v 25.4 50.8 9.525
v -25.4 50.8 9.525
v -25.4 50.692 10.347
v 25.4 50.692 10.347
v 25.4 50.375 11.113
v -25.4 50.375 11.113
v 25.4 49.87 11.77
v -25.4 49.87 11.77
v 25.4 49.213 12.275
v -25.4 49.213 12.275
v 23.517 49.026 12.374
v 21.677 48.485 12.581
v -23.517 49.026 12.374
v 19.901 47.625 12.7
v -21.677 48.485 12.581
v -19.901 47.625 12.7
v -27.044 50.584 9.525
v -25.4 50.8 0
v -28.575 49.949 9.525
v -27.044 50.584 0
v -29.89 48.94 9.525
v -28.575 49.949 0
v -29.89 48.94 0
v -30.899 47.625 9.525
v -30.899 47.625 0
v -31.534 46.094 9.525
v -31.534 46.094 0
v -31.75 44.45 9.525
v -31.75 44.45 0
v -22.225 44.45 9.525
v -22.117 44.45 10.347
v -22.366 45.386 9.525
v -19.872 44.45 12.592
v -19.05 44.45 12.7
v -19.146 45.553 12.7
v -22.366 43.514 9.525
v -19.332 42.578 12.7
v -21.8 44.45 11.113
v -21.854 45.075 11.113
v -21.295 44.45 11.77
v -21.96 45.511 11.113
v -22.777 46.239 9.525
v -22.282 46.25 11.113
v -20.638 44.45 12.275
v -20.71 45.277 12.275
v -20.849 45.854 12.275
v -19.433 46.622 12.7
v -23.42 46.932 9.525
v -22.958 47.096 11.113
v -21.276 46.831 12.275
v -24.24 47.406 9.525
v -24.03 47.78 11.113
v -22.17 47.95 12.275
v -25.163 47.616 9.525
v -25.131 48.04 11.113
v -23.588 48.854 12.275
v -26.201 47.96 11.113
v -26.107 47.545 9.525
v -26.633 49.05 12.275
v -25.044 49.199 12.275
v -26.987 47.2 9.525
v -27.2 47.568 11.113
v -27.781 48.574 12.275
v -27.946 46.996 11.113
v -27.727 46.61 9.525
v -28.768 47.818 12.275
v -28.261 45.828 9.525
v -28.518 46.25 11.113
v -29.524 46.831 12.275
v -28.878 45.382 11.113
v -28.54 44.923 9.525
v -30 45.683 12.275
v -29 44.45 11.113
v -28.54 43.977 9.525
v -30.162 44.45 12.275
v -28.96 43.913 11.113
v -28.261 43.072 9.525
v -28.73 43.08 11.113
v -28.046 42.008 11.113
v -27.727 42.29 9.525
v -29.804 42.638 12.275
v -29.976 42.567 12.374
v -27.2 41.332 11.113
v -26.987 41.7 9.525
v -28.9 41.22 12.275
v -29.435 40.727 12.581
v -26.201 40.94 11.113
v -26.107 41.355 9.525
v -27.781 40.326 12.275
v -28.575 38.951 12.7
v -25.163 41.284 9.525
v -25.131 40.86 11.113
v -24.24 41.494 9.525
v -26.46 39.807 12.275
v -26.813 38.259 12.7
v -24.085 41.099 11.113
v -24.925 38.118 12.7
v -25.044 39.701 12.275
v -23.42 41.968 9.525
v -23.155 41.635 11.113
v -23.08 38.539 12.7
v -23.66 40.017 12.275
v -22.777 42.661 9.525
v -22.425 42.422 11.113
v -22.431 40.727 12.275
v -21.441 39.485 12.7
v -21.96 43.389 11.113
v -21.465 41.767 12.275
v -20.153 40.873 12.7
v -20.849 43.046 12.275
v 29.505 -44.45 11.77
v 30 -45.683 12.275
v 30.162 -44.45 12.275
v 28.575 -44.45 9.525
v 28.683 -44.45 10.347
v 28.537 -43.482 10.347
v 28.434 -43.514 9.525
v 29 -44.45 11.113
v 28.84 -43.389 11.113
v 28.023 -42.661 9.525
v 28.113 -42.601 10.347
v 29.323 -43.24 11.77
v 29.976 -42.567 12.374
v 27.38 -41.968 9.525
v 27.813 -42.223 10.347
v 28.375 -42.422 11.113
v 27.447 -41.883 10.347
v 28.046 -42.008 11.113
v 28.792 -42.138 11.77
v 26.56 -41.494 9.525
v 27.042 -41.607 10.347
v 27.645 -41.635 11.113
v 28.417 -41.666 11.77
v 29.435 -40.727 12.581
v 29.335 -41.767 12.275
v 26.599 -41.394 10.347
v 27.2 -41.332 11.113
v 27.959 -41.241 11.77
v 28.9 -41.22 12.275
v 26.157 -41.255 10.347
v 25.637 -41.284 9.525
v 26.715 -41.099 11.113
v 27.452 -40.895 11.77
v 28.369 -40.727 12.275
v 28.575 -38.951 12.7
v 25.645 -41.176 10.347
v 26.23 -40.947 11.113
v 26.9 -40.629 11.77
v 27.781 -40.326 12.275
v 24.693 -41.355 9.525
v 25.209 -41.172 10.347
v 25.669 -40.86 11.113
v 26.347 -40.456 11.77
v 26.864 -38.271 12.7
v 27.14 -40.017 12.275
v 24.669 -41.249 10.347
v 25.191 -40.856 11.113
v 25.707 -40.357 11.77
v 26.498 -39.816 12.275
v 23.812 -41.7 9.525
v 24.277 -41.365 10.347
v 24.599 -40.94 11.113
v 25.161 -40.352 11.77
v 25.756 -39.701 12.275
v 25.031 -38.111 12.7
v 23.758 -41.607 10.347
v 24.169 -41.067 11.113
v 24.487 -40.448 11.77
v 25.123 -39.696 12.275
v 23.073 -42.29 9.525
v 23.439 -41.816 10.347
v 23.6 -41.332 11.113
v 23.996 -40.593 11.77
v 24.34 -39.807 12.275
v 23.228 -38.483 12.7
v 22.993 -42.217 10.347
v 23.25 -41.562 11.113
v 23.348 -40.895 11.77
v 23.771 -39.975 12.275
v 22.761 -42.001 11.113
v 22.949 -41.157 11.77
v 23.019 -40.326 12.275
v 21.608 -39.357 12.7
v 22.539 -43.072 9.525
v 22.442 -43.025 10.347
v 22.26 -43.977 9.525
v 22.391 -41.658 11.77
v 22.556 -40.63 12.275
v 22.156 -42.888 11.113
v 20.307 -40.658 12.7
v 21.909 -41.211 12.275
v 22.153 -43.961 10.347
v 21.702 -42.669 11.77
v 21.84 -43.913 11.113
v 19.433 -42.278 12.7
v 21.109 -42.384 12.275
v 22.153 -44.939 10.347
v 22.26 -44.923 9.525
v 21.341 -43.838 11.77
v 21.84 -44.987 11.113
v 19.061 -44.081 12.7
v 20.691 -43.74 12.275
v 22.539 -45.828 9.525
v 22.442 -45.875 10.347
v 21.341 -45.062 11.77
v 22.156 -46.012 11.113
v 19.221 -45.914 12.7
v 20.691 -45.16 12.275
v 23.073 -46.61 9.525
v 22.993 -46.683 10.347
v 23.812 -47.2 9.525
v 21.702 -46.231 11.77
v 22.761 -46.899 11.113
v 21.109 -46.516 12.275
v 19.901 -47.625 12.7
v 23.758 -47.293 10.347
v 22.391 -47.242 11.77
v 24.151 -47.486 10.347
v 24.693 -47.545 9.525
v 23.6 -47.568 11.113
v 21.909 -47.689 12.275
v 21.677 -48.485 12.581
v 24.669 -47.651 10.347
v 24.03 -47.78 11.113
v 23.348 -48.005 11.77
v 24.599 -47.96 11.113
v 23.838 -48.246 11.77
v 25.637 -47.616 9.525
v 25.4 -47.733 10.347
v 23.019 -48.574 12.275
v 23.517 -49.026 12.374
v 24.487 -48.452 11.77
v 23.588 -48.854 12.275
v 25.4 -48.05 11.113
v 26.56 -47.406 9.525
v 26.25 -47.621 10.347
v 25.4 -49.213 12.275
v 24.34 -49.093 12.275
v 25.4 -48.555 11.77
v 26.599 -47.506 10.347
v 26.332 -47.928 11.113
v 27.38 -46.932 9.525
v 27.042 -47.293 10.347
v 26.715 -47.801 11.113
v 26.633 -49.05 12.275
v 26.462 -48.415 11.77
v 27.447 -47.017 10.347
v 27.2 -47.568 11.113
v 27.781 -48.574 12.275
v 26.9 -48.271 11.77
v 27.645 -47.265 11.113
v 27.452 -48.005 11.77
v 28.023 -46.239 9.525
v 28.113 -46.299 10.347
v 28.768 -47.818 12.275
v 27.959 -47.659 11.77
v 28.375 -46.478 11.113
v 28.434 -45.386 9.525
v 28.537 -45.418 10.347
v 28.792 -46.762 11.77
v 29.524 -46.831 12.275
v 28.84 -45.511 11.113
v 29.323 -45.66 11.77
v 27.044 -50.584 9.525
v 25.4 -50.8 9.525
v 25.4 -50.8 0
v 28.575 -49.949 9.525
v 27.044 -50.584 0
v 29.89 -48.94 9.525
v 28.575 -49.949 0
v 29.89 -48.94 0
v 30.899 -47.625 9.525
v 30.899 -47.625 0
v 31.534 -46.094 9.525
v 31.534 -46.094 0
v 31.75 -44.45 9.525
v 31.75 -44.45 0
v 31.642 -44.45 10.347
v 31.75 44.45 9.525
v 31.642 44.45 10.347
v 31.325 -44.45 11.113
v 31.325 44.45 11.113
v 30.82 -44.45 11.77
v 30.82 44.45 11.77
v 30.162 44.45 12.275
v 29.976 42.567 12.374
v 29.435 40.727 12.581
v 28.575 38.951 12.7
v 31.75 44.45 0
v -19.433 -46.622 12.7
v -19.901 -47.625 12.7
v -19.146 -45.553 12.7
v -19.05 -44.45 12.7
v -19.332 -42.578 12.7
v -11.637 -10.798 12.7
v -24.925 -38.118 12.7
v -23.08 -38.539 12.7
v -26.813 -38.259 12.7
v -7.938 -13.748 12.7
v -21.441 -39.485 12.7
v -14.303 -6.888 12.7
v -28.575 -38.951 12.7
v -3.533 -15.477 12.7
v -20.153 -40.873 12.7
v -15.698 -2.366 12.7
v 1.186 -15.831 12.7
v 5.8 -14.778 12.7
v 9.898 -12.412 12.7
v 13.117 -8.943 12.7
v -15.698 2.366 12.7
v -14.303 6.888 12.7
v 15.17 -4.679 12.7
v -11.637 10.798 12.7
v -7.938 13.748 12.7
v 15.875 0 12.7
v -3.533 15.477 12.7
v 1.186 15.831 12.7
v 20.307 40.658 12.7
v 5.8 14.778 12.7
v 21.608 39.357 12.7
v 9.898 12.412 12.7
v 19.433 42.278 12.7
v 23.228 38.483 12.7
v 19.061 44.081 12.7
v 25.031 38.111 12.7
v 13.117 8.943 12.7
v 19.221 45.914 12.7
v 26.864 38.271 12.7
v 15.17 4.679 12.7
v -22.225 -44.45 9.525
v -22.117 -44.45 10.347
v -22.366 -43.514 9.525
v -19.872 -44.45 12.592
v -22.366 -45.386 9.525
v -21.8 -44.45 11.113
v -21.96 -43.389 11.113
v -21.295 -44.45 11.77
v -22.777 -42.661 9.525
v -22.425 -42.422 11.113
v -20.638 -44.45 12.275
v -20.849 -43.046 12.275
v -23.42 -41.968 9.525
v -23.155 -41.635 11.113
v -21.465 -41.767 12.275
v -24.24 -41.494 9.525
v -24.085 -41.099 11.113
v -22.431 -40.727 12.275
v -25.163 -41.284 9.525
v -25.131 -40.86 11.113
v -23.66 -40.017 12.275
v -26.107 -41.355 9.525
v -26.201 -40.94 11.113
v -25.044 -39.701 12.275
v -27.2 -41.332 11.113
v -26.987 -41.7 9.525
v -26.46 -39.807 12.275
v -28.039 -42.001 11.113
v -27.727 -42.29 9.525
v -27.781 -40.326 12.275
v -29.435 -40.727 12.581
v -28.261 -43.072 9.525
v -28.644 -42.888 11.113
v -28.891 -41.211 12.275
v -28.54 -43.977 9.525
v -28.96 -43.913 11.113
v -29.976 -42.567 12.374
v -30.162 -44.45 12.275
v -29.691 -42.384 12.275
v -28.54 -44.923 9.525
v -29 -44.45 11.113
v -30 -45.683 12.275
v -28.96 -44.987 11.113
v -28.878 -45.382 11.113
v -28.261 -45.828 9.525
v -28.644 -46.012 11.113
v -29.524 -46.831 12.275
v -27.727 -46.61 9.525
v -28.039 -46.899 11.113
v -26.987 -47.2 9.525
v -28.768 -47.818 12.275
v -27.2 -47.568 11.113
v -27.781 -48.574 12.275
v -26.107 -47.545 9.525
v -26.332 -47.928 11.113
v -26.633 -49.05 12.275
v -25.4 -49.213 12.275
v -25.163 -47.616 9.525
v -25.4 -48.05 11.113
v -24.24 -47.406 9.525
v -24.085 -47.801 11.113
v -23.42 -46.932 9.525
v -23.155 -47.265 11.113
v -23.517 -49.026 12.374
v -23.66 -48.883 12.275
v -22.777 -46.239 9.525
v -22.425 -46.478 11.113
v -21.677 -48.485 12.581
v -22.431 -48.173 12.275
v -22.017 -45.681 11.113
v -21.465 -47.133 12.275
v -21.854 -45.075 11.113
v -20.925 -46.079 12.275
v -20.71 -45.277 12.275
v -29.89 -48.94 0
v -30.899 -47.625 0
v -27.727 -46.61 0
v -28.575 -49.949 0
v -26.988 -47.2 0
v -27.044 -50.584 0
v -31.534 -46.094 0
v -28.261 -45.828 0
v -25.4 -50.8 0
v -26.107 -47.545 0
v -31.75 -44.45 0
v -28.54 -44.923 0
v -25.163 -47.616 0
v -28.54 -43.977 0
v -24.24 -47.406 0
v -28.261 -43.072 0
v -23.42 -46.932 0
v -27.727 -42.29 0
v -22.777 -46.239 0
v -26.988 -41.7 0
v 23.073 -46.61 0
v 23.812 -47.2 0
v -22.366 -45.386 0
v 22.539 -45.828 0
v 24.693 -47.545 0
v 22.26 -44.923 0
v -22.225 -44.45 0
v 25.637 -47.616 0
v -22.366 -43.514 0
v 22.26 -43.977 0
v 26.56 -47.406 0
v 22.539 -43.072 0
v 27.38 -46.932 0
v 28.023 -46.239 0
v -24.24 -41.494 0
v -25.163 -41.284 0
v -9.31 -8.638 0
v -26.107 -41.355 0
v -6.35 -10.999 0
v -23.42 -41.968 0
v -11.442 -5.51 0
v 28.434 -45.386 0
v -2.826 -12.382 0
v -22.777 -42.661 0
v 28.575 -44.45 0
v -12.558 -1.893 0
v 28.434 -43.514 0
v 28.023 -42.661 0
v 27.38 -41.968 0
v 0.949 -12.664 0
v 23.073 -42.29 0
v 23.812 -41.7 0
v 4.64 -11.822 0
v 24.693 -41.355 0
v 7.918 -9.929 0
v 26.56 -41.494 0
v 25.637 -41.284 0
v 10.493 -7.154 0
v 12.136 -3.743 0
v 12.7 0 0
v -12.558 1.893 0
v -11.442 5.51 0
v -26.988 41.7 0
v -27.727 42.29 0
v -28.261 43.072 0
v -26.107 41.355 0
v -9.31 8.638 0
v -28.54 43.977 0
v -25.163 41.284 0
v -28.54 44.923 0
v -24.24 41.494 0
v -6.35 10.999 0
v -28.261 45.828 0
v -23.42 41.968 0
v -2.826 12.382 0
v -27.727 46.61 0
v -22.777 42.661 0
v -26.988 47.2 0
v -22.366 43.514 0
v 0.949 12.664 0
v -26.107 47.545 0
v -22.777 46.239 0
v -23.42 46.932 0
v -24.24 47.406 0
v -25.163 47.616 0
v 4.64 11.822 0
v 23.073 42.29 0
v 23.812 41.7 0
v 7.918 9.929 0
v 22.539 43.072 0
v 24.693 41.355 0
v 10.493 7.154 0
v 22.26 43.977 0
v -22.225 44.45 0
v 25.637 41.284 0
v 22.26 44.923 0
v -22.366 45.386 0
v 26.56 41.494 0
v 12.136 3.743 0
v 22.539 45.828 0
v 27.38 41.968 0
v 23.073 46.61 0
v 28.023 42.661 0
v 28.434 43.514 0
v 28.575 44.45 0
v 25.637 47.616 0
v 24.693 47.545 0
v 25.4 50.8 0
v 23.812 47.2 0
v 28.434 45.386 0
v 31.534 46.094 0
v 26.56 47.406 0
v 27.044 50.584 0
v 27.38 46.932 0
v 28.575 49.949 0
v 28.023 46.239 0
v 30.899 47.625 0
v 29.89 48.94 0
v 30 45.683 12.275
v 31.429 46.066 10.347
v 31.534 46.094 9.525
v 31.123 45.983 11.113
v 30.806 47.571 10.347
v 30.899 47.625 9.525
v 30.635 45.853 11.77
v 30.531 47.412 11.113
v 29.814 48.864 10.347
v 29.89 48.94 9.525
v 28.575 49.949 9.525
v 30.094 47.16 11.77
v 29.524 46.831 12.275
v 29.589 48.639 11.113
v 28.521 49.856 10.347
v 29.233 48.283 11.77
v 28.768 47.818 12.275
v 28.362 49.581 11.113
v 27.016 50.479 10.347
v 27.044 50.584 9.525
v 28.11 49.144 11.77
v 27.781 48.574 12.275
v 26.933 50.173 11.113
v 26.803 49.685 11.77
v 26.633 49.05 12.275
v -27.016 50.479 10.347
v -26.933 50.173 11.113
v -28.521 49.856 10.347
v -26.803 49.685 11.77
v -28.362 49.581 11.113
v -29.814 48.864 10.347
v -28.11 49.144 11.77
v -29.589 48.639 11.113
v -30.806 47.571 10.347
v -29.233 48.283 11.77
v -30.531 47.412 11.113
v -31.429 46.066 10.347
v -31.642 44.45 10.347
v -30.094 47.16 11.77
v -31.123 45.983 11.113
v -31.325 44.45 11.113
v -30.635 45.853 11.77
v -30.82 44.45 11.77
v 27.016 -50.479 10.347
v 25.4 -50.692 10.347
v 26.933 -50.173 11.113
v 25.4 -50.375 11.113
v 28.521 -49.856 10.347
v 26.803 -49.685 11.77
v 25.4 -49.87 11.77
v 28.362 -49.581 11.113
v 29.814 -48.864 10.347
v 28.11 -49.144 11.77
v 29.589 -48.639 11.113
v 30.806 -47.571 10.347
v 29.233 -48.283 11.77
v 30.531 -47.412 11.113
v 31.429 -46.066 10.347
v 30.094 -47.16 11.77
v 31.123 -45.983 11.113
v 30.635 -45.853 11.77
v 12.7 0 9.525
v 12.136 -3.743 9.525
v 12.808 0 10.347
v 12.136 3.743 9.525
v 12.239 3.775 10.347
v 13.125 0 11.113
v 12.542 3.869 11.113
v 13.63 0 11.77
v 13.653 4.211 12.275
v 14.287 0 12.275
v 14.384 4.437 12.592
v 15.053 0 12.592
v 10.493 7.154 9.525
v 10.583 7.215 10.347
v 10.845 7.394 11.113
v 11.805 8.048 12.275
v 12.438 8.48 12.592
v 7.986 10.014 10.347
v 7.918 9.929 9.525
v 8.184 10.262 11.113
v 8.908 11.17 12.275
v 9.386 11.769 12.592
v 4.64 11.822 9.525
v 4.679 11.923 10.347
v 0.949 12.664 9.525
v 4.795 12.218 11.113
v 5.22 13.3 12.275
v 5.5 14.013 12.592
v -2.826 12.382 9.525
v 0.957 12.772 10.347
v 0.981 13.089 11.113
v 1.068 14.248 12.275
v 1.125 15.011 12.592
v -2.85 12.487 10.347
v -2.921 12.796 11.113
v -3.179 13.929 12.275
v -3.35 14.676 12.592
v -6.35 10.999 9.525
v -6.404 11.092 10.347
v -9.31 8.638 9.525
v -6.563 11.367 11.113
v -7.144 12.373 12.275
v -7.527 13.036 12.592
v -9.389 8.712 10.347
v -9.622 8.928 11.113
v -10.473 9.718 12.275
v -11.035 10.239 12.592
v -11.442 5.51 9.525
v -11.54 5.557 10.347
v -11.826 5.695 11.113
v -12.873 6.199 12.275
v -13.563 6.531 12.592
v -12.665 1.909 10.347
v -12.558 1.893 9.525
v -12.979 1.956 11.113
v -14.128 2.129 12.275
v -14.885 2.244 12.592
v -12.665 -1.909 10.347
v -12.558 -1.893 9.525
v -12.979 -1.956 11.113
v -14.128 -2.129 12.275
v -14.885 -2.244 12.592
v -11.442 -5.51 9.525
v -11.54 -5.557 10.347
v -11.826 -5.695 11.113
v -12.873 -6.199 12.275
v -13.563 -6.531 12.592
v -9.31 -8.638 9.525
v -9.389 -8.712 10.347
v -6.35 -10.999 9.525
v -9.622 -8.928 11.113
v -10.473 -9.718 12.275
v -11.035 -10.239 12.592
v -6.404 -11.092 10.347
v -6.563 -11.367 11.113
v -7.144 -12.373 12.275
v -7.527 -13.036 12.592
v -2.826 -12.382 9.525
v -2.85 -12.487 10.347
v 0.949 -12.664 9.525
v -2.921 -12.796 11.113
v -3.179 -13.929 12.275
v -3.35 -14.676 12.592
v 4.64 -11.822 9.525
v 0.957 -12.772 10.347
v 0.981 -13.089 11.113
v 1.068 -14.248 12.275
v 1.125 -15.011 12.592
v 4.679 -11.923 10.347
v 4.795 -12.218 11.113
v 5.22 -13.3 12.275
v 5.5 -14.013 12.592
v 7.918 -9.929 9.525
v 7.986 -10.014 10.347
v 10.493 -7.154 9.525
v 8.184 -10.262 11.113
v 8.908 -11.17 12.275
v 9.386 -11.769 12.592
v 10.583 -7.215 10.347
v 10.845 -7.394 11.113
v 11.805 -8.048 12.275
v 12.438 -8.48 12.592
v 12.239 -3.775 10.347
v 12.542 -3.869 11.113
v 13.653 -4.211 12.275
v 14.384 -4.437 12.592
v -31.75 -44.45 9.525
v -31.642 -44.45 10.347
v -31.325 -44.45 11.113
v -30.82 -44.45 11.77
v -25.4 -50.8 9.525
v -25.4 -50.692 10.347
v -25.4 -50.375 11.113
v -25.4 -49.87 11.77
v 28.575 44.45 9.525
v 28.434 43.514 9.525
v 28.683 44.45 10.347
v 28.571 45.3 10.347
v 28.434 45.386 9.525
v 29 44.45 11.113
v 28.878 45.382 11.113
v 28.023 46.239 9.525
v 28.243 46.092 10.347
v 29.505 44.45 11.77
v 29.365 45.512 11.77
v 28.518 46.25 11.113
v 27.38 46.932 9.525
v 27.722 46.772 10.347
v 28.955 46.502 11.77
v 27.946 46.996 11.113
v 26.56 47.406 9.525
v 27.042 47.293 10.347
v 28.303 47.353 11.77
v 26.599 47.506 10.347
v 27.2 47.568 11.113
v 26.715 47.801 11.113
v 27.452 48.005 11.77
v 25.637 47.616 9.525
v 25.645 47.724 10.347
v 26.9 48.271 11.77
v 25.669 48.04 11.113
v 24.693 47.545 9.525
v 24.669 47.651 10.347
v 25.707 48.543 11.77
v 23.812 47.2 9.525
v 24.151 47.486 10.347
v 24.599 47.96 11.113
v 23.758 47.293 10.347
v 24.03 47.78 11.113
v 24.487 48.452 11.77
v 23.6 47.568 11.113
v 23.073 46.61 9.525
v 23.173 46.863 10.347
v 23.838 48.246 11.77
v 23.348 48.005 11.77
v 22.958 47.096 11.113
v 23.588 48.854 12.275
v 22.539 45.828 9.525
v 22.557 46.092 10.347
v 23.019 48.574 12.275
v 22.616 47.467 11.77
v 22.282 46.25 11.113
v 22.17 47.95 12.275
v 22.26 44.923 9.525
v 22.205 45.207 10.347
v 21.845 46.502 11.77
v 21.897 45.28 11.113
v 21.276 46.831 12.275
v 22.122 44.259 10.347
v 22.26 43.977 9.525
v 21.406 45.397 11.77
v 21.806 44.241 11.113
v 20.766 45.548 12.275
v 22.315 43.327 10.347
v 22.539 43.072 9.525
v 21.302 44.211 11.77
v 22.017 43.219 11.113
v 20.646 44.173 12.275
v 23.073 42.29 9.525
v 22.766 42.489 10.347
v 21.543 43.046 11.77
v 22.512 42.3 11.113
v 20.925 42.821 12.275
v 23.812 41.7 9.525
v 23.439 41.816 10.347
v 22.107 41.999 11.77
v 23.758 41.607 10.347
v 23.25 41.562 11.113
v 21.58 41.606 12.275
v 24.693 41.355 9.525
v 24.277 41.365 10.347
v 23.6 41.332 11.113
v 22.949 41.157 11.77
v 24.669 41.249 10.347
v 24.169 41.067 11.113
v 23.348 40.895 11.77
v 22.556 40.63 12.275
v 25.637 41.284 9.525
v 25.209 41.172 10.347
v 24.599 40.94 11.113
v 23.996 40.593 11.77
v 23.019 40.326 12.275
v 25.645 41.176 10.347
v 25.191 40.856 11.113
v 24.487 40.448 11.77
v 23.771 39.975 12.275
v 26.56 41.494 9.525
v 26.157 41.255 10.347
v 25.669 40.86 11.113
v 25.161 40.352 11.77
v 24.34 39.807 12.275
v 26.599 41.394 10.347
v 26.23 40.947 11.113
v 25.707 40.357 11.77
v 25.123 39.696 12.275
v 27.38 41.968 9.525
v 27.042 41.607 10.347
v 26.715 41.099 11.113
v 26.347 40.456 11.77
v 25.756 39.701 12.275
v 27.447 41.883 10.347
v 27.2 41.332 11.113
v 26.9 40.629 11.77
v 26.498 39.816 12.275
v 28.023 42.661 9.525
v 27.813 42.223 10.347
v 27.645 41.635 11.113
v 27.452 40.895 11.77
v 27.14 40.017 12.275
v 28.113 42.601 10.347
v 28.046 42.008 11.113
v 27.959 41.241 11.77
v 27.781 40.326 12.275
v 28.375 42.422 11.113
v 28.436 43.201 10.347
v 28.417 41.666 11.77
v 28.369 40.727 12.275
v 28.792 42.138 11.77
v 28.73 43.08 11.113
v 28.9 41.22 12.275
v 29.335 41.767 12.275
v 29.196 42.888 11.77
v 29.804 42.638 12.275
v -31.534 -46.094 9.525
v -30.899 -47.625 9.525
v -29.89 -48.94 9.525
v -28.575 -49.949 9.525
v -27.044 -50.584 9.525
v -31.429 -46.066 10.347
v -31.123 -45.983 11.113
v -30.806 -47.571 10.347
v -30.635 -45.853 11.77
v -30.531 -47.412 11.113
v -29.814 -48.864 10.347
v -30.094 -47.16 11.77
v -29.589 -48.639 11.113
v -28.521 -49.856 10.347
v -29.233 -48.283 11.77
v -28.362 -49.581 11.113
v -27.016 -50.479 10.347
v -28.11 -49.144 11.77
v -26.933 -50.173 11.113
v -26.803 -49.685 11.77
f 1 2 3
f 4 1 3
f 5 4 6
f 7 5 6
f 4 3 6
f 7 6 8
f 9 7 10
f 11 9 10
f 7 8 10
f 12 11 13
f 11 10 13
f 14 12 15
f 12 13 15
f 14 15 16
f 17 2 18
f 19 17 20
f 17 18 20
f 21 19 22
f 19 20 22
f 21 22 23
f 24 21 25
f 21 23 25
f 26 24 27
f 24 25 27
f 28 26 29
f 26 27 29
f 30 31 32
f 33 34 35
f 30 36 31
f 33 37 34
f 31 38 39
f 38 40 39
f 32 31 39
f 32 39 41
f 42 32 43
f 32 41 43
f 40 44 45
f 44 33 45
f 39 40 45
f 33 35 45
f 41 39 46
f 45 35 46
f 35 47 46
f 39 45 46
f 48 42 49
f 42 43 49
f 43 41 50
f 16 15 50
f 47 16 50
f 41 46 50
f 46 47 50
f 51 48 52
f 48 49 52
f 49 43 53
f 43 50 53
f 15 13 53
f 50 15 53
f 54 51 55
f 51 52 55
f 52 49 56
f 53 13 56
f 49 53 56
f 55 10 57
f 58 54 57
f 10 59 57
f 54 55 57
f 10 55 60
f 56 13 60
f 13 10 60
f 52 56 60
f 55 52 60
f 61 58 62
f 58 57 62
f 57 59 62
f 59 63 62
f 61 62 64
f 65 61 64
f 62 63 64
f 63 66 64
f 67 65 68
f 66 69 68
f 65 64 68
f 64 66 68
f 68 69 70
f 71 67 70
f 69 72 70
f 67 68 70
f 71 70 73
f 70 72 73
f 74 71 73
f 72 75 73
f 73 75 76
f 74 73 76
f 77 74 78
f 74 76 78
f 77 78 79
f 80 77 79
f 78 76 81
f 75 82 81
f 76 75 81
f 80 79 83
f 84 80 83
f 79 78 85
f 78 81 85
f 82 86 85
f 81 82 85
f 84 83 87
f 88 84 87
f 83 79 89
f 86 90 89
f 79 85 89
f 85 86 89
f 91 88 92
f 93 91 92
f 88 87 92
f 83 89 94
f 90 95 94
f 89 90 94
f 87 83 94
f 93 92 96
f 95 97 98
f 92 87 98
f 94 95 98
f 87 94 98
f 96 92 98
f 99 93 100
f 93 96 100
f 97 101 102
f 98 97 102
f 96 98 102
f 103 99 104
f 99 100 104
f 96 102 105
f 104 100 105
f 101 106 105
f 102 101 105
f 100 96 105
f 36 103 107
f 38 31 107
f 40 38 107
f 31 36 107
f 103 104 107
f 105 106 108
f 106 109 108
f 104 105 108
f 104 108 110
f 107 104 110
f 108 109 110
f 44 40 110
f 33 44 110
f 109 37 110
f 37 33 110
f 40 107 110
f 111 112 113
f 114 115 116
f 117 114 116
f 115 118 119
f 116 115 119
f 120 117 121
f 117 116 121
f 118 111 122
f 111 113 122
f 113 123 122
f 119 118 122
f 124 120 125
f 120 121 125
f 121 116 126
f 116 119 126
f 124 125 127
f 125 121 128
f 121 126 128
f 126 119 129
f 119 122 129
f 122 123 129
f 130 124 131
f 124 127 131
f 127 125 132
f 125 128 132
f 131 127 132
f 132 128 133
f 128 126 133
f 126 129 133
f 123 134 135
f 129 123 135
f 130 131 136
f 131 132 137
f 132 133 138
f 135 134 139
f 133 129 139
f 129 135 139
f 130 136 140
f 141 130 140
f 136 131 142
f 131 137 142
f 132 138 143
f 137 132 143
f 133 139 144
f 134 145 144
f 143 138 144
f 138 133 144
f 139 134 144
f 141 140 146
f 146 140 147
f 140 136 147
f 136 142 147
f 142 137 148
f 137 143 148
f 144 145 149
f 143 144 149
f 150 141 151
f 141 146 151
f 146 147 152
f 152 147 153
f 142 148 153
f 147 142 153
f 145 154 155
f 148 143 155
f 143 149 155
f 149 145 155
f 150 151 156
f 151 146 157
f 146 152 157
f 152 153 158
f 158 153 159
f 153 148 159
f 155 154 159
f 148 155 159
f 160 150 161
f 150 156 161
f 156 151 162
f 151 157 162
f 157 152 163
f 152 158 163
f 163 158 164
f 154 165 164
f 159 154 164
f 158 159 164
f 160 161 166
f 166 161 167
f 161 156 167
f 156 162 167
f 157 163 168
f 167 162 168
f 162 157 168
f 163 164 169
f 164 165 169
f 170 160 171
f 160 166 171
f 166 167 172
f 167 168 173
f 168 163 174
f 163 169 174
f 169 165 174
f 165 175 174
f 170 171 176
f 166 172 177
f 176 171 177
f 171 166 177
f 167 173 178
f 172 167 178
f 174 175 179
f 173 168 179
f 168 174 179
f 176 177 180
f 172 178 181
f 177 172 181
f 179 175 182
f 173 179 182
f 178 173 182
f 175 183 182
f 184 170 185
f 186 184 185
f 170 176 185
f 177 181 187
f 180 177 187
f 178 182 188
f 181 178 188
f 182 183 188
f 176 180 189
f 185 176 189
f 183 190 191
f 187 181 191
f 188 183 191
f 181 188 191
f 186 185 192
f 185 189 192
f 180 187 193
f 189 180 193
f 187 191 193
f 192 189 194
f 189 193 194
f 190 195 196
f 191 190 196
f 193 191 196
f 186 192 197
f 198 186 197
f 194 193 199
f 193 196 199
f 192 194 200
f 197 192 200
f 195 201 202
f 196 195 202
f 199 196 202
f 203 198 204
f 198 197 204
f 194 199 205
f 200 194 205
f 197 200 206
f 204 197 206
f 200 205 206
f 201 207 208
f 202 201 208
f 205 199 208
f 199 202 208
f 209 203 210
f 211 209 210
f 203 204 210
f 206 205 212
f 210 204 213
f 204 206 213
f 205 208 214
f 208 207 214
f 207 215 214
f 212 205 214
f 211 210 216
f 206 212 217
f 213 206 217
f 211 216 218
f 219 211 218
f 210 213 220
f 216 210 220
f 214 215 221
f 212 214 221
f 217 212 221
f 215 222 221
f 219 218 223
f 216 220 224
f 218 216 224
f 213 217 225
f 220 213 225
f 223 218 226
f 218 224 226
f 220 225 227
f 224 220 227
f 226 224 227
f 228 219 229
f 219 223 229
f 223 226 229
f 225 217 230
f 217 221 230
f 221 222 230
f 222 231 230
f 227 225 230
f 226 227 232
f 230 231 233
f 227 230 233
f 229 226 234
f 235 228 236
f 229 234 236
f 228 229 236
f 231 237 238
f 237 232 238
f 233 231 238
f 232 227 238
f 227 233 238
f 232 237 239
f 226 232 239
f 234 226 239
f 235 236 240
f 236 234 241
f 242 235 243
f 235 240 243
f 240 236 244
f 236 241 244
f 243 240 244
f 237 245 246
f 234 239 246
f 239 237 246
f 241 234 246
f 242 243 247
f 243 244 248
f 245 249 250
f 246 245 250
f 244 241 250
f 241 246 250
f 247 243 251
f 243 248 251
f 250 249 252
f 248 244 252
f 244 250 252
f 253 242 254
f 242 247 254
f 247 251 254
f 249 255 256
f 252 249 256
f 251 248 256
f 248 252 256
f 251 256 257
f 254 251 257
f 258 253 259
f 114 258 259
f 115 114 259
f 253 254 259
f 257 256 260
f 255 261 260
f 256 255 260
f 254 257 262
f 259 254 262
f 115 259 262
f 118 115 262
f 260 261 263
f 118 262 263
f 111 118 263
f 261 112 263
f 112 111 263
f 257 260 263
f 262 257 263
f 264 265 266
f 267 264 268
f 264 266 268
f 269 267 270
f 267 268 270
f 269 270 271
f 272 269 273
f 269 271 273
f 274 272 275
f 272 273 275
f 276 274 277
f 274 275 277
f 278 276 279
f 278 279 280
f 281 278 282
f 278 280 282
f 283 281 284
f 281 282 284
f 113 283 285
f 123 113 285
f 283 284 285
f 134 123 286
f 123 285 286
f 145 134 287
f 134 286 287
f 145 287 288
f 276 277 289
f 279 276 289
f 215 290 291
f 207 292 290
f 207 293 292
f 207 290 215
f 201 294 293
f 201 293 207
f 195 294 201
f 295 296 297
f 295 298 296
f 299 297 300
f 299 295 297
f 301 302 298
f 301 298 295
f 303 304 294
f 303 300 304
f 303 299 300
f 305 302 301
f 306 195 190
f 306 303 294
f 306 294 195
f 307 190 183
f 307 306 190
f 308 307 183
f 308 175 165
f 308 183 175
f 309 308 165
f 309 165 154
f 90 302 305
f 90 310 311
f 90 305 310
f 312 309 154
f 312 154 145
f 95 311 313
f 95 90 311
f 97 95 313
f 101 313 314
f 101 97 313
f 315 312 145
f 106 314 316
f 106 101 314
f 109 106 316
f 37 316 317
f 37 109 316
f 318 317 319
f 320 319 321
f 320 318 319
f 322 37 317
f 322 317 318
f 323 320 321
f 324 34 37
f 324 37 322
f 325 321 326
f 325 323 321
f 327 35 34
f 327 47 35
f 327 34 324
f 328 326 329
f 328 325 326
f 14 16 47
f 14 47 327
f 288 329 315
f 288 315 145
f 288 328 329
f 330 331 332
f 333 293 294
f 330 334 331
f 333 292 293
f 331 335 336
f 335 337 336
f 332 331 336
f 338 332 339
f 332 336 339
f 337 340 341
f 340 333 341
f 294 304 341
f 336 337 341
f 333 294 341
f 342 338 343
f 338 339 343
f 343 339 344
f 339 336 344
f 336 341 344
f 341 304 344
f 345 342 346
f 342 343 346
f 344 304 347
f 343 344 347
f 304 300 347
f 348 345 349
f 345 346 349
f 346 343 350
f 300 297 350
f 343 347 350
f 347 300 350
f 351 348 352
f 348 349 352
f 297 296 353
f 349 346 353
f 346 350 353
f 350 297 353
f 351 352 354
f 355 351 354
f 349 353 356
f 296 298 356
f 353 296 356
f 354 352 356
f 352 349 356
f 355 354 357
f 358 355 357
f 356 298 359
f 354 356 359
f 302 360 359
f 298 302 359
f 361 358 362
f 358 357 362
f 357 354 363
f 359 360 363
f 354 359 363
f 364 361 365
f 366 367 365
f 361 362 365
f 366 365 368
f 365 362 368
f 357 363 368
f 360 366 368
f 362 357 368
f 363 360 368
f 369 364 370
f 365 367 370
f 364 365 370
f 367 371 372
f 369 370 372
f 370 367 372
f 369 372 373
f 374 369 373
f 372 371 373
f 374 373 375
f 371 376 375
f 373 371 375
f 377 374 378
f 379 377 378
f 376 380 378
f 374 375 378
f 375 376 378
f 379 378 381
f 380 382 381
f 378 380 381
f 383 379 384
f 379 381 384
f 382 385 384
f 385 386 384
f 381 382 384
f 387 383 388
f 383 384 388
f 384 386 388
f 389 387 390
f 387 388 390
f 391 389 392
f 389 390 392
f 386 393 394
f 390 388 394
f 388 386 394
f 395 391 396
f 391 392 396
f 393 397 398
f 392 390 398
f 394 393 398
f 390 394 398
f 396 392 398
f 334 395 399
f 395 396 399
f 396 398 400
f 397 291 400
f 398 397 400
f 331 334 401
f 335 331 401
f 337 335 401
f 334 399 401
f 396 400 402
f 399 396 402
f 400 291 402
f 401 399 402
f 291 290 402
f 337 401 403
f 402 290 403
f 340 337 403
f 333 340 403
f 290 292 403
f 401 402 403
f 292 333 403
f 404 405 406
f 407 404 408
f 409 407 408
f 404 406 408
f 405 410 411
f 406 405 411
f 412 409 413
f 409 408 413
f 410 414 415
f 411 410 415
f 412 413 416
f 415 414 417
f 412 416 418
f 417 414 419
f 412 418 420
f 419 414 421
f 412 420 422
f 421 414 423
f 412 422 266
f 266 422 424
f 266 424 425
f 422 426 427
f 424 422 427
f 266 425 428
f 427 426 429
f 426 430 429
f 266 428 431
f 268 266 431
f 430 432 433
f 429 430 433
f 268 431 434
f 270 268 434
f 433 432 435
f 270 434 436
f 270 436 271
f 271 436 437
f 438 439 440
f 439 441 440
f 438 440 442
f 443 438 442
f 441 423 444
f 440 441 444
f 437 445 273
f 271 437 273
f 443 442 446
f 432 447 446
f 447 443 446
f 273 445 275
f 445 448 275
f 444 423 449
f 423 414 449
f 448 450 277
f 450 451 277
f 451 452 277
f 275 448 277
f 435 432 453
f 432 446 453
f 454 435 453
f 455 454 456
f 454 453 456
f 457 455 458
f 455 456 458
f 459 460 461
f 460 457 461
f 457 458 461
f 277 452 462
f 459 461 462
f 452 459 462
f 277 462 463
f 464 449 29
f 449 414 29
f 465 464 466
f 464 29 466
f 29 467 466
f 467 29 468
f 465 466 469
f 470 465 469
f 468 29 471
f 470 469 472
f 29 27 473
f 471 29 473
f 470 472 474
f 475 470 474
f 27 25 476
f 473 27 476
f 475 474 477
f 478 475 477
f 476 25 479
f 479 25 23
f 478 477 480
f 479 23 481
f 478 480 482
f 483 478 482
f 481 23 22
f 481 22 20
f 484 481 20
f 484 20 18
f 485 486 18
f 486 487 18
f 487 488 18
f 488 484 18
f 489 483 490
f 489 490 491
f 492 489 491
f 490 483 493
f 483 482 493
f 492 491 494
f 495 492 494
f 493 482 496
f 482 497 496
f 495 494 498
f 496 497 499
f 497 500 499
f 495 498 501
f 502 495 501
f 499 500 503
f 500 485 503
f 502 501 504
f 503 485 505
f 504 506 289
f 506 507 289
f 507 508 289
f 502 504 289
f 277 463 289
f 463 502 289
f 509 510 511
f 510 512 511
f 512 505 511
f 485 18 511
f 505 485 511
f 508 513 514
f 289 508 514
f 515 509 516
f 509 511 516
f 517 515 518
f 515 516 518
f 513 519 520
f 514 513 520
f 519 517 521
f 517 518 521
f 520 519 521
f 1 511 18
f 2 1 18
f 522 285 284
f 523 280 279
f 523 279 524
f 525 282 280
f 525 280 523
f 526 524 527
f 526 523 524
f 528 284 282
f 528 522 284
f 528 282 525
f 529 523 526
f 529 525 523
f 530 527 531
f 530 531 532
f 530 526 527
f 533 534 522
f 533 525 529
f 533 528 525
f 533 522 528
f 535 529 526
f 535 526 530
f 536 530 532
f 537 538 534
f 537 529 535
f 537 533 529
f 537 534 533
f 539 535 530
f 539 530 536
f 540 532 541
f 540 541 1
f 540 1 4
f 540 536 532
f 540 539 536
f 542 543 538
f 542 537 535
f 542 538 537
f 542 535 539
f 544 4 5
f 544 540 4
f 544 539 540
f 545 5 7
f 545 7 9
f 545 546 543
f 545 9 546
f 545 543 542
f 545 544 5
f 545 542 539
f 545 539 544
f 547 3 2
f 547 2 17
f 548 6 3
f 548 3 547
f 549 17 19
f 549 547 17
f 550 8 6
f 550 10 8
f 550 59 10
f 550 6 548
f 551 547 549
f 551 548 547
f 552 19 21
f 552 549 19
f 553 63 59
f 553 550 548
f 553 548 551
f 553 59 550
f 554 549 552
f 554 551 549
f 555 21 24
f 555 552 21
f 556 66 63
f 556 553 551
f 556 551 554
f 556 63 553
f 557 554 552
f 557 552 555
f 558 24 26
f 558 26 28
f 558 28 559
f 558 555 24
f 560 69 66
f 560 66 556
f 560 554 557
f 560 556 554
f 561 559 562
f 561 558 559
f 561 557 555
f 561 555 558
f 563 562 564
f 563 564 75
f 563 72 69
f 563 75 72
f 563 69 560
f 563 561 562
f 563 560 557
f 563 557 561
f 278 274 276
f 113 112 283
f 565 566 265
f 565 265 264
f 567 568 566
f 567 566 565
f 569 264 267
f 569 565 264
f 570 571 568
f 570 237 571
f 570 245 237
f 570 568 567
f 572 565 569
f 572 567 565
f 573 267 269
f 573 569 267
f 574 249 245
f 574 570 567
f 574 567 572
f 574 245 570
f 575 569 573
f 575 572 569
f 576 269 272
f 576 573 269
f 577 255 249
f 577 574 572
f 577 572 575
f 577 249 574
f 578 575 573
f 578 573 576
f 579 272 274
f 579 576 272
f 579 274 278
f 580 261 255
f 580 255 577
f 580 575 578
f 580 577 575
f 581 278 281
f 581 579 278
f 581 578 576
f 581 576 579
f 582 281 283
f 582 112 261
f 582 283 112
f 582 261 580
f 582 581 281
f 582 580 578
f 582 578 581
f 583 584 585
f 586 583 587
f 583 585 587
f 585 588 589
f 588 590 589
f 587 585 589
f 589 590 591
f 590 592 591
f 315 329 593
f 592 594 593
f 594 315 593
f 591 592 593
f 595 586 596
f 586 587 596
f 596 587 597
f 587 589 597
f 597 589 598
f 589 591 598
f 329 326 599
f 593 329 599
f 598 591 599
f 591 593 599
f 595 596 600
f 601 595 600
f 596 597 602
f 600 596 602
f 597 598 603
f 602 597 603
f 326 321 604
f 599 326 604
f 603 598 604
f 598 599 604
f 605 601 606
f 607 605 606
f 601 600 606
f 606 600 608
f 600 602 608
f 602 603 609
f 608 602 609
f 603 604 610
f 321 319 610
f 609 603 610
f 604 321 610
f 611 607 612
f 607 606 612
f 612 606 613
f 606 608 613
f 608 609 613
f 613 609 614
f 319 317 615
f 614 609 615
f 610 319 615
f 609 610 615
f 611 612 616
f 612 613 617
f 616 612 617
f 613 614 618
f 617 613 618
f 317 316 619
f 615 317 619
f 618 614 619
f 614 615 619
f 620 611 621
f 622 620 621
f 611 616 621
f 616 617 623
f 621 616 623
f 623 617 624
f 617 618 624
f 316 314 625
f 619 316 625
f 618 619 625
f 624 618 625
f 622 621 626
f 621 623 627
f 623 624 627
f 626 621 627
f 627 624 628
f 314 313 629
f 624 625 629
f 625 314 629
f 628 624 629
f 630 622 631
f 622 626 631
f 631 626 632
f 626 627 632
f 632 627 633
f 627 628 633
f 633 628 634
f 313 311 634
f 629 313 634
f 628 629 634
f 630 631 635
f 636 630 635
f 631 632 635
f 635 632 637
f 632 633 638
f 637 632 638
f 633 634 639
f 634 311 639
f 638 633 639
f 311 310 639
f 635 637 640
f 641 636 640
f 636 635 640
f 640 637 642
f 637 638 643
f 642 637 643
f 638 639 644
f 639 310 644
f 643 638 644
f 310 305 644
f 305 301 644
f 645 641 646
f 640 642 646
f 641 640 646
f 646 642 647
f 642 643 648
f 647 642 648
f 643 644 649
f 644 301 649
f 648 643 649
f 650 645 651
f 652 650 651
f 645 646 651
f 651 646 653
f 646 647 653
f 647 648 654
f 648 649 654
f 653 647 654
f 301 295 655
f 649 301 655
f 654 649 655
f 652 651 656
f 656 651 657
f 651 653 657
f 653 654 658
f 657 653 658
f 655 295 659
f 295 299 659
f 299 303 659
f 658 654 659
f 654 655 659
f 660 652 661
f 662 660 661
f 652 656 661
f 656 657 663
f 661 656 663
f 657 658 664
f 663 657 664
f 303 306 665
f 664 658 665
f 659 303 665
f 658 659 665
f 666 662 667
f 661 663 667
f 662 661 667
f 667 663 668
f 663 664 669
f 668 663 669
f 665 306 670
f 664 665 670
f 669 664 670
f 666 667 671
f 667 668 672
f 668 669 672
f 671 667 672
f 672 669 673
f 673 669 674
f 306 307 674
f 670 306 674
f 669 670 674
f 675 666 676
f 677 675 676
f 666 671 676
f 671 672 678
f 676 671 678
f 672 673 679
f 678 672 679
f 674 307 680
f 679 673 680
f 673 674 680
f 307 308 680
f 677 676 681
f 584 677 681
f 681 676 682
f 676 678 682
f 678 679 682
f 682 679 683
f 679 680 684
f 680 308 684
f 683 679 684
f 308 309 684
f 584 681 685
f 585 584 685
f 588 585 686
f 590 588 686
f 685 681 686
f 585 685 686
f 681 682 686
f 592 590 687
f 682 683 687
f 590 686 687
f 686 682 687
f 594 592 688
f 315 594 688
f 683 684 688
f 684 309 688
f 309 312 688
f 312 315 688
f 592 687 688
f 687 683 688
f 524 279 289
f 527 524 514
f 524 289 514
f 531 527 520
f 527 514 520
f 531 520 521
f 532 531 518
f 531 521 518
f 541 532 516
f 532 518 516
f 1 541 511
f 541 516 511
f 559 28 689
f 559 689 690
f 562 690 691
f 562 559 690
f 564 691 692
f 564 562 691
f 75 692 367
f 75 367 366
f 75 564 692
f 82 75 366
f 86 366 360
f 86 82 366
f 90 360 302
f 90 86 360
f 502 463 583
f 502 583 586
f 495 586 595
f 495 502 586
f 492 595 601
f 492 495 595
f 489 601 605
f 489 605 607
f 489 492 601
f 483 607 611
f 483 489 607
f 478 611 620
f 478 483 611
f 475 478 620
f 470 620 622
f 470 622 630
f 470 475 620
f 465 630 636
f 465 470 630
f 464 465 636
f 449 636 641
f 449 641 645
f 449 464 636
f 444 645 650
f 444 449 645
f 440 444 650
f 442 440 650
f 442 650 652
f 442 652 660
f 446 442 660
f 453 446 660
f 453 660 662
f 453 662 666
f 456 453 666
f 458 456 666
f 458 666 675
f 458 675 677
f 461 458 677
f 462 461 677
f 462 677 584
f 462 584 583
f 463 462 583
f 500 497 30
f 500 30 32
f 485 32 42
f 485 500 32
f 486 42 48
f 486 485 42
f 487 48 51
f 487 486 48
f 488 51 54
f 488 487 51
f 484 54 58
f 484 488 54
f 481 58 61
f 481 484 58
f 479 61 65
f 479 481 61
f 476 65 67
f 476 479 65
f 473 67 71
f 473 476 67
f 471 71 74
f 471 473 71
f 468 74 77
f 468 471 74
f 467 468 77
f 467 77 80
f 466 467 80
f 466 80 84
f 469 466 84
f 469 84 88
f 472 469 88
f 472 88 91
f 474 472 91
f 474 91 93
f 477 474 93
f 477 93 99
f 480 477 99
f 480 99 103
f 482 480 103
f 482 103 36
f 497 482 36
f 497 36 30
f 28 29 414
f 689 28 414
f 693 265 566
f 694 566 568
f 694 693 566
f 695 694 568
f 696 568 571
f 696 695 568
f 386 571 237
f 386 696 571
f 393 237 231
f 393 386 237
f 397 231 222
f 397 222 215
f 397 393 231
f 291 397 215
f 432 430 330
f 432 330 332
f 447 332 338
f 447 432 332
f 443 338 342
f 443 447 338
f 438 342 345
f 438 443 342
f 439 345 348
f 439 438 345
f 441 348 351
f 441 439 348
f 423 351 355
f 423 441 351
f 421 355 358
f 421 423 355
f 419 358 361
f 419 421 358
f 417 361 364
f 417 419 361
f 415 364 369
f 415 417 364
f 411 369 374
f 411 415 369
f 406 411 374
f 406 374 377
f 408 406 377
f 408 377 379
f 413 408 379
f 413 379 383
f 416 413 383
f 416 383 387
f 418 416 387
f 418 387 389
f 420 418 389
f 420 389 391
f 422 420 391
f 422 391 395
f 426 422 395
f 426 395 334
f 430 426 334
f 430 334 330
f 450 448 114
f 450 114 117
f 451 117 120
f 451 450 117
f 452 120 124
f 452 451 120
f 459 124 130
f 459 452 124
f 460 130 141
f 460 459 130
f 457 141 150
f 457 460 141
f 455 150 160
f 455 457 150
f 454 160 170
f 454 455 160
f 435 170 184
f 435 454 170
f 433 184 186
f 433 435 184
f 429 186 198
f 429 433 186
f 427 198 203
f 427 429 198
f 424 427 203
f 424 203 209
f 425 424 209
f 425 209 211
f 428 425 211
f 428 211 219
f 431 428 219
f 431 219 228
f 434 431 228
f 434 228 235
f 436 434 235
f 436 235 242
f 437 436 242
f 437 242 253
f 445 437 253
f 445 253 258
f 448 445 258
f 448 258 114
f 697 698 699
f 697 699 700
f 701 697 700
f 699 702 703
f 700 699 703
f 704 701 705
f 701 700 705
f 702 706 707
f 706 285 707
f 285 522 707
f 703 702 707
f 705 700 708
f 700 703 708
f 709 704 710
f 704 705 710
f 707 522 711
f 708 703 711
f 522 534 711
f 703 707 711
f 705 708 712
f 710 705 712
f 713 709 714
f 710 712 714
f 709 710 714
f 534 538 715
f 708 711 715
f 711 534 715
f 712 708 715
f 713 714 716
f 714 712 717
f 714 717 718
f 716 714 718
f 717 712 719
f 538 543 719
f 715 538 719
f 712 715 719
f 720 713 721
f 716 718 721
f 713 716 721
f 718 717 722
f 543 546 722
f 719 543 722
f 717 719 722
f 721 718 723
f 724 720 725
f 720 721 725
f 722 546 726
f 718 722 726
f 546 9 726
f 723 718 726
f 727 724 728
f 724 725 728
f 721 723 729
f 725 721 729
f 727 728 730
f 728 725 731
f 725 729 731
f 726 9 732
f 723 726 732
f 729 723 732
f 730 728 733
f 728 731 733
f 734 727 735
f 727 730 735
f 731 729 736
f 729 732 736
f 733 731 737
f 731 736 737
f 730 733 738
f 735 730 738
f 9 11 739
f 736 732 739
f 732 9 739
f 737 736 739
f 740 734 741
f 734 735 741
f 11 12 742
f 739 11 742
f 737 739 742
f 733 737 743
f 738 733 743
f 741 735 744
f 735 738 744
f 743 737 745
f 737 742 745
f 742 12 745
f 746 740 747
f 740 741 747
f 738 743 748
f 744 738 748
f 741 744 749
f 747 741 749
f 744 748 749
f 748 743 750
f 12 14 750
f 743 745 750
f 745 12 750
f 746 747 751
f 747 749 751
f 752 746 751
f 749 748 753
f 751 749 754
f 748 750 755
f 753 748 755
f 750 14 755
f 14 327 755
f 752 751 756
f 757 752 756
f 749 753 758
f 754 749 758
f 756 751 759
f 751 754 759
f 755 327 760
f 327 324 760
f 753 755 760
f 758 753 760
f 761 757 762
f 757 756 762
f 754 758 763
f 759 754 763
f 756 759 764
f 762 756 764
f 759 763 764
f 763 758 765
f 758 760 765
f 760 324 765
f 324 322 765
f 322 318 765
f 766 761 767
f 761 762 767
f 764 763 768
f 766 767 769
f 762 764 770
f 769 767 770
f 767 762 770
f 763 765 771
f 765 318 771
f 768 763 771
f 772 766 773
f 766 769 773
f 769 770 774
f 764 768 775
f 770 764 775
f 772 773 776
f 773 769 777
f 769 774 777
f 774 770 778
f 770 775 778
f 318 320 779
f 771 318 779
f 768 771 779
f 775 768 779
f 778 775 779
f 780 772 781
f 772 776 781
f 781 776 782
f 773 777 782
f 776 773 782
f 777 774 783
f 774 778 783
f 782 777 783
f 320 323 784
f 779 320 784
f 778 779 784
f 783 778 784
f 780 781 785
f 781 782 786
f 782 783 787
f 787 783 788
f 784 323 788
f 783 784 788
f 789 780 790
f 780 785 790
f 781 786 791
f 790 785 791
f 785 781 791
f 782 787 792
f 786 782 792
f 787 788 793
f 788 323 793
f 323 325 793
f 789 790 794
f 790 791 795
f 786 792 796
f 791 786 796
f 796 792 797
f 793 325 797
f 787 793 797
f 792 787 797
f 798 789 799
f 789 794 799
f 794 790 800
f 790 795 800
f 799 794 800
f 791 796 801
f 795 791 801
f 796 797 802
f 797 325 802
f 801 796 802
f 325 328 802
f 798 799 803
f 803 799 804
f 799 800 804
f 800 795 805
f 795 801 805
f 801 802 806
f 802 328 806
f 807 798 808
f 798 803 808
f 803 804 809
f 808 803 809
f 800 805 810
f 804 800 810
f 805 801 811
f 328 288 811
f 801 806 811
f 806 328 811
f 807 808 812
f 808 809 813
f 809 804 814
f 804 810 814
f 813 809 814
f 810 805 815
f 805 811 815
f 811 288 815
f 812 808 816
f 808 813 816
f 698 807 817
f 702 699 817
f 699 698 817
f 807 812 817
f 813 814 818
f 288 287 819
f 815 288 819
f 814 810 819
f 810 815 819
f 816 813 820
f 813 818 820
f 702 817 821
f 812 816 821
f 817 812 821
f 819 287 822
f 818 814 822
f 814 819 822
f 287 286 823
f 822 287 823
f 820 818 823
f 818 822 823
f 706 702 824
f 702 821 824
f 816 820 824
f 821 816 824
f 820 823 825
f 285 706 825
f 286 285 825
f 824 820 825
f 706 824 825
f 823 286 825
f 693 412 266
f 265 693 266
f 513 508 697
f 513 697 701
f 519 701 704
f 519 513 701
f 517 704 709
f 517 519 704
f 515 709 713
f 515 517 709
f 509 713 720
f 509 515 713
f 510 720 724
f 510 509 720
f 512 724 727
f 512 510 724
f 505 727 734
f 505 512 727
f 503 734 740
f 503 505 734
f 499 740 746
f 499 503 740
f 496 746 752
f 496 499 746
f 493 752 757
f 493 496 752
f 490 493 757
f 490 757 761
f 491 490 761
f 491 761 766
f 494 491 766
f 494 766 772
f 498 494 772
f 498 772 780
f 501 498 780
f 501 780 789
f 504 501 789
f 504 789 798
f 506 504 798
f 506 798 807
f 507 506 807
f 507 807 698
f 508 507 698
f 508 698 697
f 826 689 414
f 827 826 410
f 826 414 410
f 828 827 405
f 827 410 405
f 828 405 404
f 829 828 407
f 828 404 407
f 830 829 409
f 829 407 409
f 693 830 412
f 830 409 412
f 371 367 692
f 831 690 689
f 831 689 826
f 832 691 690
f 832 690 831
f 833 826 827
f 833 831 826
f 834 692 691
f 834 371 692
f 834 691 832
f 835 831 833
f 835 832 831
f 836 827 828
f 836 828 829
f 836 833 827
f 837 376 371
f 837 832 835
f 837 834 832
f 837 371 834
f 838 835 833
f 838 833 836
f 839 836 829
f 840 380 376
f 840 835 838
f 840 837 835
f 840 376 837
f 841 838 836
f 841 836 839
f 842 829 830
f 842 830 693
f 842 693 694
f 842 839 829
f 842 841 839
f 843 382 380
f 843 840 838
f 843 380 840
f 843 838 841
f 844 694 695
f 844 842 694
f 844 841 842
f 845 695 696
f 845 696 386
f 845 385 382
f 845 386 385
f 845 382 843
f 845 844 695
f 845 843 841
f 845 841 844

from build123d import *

# Parameters (mm, degrees)
F0_R         = 3.175
F0_R_2       = 12.7
F1_DEPTH     = 12.7
F2_T1_DEPTH  = 50.8
F2_T3_DEPTH  = 88.9
F2_T6_ANGLE  = 90
F2_T8_ANGLE  = 90
F2_T10_ANGLE = 90
F2_T12_ANGLE = 90


# Not quite as in the source:
# - a fillet or chamfer that OpenCascade refuses, or shapes differently, is made with other operations: its cross-section is extruded or revolved along the edge and cut away or added


with BuildPart() as f1:
    # F0 (on Top) → F1 (new body)
    with BuildSketch(Plane.XY):
        with BuildLine():
            ThreePointArc((31.75, 44.45), (29.8901280605, 48.9401280605), (25.4, 50.8))
            Line((25.4, 50.8), (-25.4, 50.8))
            ThreePointArc((-25.4, 50.8), (-29.8901280605, 48.9401280605), (-31.75, 44.45))
            Line((-31.75, 44.45), (-31.75, -44.45))
            ThreePointArc((-31.75, -44.45), (-29.8901280605, -48.9401280605), (-25.4, -50.8))
            Line((-25.4, -50.8), (25.4, -50.8))
            ThreePointArc((25.4, -50.8), (29.8901280605, -48.9401280605), (31.75, -44.45))
            Line((31.75, -44.45), (31.75, 44.45))
        make_face()
        with Locations((-25.4, -44.45)):
            Circle(F0_R, mode=Mode.SUBTRACT)
        with Locations((25.4, -44.45)):
            Circle(F0_R, mode=Mode.SUBTRACT)
        Circle(F0_R_2, mode=Mode.SUBTRACT)
        with Locations((-25.4, 44.45)):
            Circle(F0_R, mode=Mode.SUBTRACT)
        with Locations((25.4, 44.45)):
            Circle(F0_R, mode=Mode.SUBTRACT)
    extrude(amount=F1_DEPTH)

    # F2: fillet of radius 3.175 on 13 edges, made by hand

    # F2_s2 → F2_t1 (cut)
    with BuildSketch(Plane.YZ.offset(-25.4)):
        with BuildLine():
            ThreePointArc((50.8, 9.525), (49.8700640303, 11.7700640303), (47.625, 12.7))
            Line((47.625, 12.7), (50.8, 12.7))
            Line((50.8, 12.7), (50.8, 9.525))
        make_face()
        with BuildLine():
            ThreePointArc((-50.8, 9.525), (-49.8700640303, 11.7700640303), (-47.625, 12.7))
            Line((-47.625, 12.7), (-50.8, 12.7))
            Line((-50.8, 12.7), (-50.8, 9.525))
        make_face()
    extrude(amount=F2_T1_DEPTH, mode=Mode.SUBTRACT)

    # F2_s4 → F2_t3 (cut)
    with BuildSketch(Plane.XZ.offset(-44.45)):
        with BuildLine():
            ThreePointArc((-31.75, 9.525), (-30.8200640303, 11.7700640303), (-28.575, 12.7))
            Line((-28.575, 12.7), (-31.75, 12.7))
            Line((-31.75, 12.7), (-31.75, 9.525))
        make_face()
        with BuildLine():
            ThreePointArc((31.75, 9.525), (30.8200640303, 11.7700640303), (28.575, 12.7))
            Line((28.575, 12.7), (31.75, 12.7))
            Line((31.75, 12.7), (31.75, 9.525))
        make_face()
    extrude(amount=F2_T3_DEPTH, mode=Mode.SUBTRACT)

    # F2_s5 → F2_t6 (revolve, cut)
    with BuildSketch(Plane.XZ.offset(-44.45)):
        with BuildLine():
            ThreePointArc((31.75, 9.525), (30.8200640303, 11.7700640303), (28.575, 12.7))
            Line((28.575, 12.7), (31.75, 12.7))
            Line((31.75, 12.7), (31.75, 9.525))
        make_face()
    revolve(axis=Axis((25.4, 44.45, 12.7), (0, 0, 1)), revolution_arc=F2_T6_ANGLE, mode=Mode.SUBTRACT)

    # F2_s7 → F2_t8 (revolve, cut)
    with BuildSketch(Plane.YZ.offset(-25.4)):
        with BuildLine():
            ThreePointArc((50.8, 9.525), (49.8700640303, 11.7700640303), (47.625, 12.7))
            Line((47.625, 12.7), (50.8, 12.7))
            Line((50.8, 12.7), (50.8, 9.525))
        make_face()
    revolve(axis=Axis((-25.4, 44.45, 12.7), (0, 0, 1)), revolution_arc=F2_T8_ANGLE, mode=Mode.SUBTRACT)

    # F2_s9 → F2_t10 (revolve, cut)
    with BuildSketch(Plane.XZ.offset(44.45)):
        with BuildLine():
            ThreePointArc((-31.75, 9.525), (-30.8200640303, 11.7700640303), (-28.575, 12.7))
            Line((-28.575, 12.7), (-31.75, 12.7))
            Line((-31.75, 12.7), (-31.75, 9.525))
        make_face()
    revolve(axis=Axis((-25.4, -44.45, 12.7), (0, 0, 1)), revolution_arc=F2_T10_ANGLE, mode=Mode.SUBTRACT)

    # F2_s11 → F2_t12 (revolve, cut)
    with BuildSketch(Plane.YZ.offset(25.4)):
        with BuildLine():
            ThreePointArc((-50.8, 9.525), (-49.8700640303, 11.7700640303), (-47.625, 12.7))
            Line((-47.625, 12.7), (-50.8, 12.7))
            Line((-50.8, 12.7), (-50.8, 9.525))
        make_face()
    revolve(axis=Axis((25.4, -44.45, 12.7), (0, 0, 1)), revolution_arc=F2_T12_ANGLE, mode=Mode.SUBTRACT)

    # F2_s13 → F2_t14 (revolve, cut)
    with BuildSketch(Plane.XZ.offset(44.45)):
        with BuildLine():
            ThreePointArc((-22.225, 9.525), (-21.2950640303, 11.7700640303), (-19.05, 12.7))
            Line((-19.05, 12.7), (-22.225, 12.7))
            Line((-22.225, 12.7), (-22.225, 9.525))
        make_face()
    revolve(axis=Axis((-25.4, -44.45, 12.7), (0, 0, 1)), mode=Mode.SUBTRACT)

    # F2_s15 → F2_t16 (revolve, cut)
    with BuildSketch(Plane.XZ.offset(44.45)):
        with BuildLine():
            ThreePointArc((28.575, 9.525), (29.5049359697, 11.7700640303), (31.75, 12.7))
            Line((31.75, 12.7), (28.575, 12.7))
            Line((28.575, 12.7), (28.575, 9.525))
        make_face()
    revolve(axis=Axis((25.4, -44.45, 12.7), (0, 0, 1)), mode=Mode.SUBTRACT)

    # F2_s17 → F2_t18 (revolve, cut)
    with BuildSketch(Plane.XZ):
        with BuildLine():
            ThreePointArc((12.7, 9.525), (13.6299359697, 11.7700640303), (15.875, 12.7))
            Line((15.875, 12.7), (12.7, 12.7))
            Line((12.7, 12.7), (12.7, 9.525))
        make_face()
    revolve(axis=Axis((0, 0, 12.7), (0, 0, 1)), mode=Mode.SUBTRACT)

    # F2_s19 → F2_t20 (revolve, cut)
    with BuildSketch(Plane.XZ.offset(-44.45)):
        with BuildLine():
            ThreePointArc((-22.225, 9.525), (-21.2950640303, 11.7700640303), (-19.05, 12.7))
            Line((-19.05, 12.7), (-22.225, 12.7))
            Line((-22.225, 12.7), (-22.225, 9.525))
        make_face()
    revolve(axis=Axis((-25.4, 44.45, 12.7), (0, 0, 1)), mode=Mode.SUBTRACT)

    # F2_s21 → F2_t22 (revolve, cut)
    with BuildSketch(Plane.XZ.offset(-44.45)):
        with BuildLine():
            ThreePointArc((28.575, 9.525), (29.5049359697, 11.7700640303), (31.75, 12.7))
            Line((31.75, 12.7), (28.575, 12.7))
            Line((28.575, 12.7), (28.575, 9.525))
        make_face()
    revolve(axis=Axis((25.4, 44.45, 12.7), (0, 0, 1)), mode=Mode.SUBTRACT)


solid = f1.part
